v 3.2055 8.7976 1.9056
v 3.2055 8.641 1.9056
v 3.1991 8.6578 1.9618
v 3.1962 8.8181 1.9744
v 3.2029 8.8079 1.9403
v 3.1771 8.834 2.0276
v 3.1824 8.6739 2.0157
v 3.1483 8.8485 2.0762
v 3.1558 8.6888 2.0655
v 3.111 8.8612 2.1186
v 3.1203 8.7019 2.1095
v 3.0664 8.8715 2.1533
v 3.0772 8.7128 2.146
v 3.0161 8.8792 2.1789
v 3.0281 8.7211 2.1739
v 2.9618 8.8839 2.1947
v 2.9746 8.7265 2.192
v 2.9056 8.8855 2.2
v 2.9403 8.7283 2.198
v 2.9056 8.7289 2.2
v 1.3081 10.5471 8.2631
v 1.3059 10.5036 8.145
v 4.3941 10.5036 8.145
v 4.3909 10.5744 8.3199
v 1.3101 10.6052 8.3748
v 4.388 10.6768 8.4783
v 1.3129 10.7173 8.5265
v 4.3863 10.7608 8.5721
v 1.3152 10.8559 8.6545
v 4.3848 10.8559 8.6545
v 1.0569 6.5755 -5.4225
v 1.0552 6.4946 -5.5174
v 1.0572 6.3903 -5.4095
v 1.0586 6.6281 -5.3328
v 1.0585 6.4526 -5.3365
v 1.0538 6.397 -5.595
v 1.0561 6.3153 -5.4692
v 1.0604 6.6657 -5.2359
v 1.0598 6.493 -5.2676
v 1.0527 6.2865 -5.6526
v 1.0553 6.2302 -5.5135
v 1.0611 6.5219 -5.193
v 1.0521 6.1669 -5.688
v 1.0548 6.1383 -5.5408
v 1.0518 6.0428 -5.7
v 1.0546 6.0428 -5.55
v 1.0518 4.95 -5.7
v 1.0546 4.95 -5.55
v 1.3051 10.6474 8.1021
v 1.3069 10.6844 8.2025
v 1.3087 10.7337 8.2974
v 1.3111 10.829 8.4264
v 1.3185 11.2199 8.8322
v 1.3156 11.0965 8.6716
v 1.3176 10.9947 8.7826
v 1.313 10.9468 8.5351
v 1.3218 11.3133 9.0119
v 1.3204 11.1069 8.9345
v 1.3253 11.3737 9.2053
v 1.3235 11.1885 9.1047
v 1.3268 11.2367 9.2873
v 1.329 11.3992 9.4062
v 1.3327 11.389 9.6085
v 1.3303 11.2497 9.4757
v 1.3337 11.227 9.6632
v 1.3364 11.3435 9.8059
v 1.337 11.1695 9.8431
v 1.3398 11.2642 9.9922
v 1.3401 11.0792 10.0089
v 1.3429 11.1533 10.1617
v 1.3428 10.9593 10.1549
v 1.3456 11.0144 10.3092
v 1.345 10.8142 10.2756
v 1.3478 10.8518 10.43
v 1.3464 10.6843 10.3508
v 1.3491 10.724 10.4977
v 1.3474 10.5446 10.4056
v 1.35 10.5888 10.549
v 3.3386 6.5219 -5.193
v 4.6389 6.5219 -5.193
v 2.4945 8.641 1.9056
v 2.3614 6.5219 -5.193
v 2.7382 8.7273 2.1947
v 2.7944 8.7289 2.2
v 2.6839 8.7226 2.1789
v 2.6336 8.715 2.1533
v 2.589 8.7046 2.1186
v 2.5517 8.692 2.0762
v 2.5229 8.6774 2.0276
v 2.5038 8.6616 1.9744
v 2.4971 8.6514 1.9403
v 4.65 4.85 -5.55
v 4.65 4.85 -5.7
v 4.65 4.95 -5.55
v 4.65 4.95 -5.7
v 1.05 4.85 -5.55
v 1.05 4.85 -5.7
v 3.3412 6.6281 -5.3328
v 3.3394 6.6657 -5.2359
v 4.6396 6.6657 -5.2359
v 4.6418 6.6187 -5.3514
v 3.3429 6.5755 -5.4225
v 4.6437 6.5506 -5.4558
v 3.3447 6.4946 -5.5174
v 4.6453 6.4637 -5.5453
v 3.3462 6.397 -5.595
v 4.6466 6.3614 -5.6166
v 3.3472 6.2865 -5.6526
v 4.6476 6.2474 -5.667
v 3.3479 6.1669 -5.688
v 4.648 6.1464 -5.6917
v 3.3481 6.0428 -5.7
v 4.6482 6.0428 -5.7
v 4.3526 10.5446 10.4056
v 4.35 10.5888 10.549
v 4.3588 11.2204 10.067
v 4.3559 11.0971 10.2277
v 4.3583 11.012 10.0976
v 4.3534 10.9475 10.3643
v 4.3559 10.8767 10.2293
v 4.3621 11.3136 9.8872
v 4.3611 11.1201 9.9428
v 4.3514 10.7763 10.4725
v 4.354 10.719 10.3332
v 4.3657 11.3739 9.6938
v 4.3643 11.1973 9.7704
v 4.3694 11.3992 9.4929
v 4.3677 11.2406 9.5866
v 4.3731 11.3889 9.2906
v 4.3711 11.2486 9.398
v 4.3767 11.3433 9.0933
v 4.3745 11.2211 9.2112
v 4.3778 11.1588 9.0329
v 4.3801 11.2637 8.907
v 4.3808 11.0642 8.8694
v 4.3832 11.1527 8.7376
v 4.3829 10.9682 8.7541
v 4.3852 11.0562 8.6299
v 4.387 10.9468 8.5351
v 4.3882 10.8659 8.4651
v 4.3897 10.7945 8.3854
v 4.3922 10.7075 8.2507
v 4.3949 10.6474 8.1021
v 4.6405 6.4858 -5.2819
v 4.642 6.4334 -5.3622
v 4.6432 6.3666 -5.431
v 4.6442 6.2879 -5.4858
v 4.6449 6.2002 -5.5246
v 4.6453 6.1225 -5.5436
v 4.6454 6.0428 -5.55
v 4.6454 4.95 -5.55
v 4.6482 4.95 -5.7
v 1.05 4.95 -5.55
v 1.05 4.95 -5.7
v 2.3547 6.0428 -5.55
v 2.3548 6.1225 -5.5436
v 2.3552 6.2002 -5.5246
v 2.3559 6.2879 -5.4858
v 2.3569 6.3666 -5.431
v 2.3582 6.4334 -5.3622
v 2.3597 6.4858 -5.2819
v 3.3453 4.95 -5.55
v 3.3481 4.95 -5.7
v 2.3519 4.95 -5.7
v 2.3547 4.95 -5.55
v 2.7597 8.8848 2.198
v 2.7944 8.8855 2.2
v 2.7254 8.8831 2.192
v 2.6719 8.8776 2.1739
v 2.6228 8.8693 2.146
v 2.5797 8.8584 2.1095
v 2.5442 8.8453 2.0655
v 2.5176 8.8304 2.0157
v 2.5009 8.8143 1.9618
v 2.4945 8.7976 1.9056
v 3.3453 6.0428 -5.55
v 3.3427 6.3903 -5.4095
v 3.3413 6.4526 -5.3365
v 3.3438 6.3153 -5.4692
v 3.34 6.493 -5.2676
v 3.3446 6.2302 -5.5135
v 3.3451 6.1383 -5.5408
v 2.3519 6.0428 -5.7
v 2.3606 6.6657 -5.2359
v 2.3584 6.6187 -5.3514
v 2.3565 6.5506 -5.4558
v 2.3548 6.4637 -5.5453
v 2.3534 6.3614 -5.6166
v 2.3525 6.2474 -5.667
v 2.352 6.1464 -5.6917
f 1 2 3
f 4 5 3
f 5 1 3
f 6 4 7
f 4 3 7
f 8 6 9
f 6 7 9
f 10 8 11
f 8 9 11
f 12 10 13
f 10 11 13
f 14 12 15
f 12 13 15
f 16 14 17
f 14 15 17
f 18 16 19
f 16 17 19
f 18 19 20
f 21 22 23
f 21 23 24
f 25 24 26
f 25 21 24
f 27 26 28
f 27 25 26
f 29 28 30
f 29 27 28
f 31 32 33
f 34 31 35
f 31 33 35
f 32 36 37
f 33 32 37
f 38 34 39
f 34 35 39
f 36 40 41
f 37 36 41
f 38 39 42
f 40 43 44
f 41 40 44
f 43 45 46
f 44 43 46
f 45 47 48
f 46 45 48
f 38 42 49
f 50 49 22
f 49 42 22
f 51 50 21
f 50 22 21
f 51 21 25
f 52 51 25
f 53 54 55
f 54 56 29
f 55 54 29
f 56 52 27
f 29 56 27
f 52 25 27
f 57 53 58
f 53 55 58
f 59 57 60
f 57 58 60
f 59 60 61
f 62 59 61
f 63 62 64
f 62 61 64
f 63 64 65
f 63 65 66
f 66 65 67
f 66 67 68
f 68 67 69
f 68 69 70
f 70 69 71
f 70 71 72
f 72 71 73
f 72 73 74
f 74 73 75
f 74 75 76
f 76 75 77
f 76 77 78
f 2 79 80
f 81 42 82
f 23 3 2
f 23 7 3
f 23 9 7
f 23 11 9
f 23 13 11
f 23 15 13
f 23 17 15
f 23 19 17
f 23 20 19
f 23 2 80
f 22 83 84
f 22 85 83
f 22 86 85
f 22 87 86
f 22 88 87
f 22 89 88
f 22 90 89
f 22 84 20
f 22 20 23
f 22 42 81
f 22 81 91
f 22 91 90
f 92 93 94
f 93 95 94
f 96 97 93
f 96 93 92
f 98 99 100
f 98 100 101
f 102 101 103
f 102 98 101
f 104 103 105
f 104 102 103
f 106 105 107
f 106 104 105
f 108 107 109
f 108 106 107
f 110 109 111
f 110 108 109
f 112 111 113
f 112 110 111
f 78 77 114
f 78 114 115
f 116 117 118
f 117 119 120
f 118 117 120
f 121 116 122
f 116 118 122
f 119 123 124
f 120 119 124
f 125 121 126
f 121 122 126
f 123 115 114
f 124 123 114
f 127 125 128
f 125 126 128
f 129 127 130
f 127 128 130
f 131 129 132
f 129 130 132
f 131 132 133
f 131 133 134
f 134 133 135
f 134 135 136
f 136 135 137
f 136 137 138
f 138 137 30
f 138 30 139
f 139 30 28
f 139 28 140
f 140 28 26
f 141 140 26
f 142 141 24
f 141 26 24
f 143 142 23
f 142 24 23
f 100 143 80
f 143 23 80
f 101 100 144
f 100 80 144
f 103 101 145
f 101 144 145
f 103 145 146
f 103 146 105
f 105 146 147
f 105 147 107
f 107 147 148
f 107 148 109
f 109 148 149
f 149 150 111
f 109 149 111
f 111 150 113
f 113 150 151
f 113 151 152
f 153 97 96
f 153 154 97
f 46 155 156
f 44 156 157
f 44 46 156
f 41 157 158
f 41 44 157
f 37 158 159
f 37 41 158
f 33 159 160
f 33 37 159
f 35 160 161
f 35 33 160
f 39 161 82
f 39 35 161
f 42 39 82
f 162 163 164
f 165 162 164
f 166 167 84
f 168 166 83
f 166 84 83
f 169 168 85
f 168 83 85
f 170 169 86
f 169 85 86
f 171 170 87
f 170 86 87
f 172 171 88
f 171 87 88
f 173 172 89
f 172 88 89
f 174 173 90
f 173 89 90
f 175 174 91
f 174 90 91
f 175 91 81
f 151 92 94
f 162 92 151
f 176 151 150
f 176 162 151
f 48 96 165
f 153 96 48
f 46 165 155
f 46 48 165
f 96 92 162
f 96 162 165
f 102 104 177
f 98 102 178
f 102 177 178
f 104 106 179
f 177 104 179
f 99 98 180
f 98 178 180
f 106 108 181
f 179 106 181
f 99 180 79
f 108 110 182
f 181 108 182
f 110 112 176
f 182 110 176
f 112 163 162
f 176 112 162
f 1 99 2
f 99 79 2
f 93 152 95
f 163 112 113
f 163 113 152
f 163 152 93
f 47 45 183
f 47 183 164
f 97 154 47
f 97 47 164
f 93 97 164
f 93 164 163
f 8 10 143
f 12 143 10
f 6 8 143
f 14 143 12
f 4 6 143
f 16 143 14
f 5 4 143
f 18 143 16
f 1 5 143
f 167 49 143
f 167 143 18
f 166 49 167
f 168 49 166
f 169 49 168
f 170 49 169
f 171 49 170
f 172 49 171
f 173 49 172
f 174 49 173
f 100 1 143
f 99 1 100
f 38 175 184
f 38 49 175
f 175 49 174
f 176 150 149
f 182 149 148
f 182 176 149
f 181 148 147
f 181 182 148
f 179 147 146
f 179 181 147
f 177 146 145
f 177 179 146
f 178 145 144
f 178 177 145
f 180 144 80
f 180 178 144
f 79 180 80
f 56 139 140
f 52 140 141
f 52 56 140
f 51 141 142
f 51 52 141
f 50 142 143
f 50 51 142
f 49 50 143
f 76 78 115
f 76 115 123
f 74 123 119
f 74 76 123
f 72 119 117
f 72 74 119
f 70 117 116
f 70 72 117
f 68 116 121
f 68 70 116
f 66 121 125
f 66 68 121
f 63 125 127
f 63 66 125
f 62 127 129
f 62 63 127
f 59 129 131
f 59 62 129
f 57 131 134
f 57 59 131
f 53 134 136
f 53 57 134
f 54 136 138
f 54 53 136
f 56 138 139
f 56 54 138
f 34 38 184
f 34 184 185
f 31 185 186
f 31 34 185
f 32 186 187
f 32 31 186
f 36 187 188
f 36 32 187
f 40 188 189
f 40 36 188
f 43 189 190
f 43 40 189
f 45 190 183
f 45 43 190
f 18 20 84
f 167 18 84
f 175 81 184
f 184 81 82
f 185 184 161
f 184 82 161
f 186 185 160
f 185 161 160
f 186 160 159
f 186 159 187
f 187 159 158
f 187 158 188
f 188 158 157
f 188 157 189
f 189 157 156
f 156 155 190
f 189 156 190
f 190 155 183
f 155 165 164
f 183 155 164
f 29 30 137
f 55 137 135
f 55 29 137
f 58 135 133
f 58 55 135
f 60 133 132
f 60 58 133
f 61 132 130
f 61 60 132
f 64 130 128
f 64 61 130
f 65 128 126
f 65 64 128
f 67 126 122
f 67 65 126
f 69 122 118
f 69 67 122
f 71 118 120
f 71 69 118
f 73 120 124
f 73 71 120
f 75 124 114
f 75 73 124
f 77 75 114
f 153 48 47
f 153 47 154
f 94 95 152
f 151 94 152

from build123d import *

# Parameters (mm, degrees)
HOOK_LEVER_DEPTH      = 1.8
HOOK_LEVER_DEPTH_BACK = 1.8
CUT_DEPTH             = 14.210060999


with BuildPart() as part:
    # Эскиз1 → Hook_Lever (new, two sides: drawn at the far end of the back side and taken through both)
    with BuildSketch(Plane(origin=(2.85, 0, 0), x_dir=(0, 0, -1), z_dir=(1, 0, 0)).offset(-HOOK_LEVER_DEPTH_BACK)):
        with BuildLine():
            Line((5.55, 4.85), (5.55, 6.042820323))
            ThreePointArc((5.55, 6.042820323), (5.450943953, 6.341557576), (5.193024215, 6.521927904))
            Line((5.193024215, 6.521927904), (-8.144994918, 10.50362176))
            ThreePointArc((-8.144994918, 10.50362176), (-8.427699037, 10.639328236), (-8.654473244, 10.855918461))
            ThreePointArc((-8.654473244, 10.855918461), (-9.625040353, 11.23456126), (-10.40562376, 10.544589936))
            Line((-10.40562376, 10.544589936), (-10.548967324, 10.588778426))
            ThreePointArc((-10.548967324, 10.588778426), (-9.651296406, 11.382245449), (-8.535144231, 10.94680623))
            ThreePointArc((-8.535144231, 10.94680623), (-8.342386155, 10.762704538), (-8.102087654, 10.647354034))
            Line((-8.102087654, 10.647354034), (5.235931479, 6.665660178))
            ThreePointArc((5.235931479, 6.665660178), (5.571227139, 6.431178752), (5.7, 6.042820323))
            Line((5.7, 6.042820323), (5.7, 4.85))
            Line((5.7, 4.85), (5.55, 4.85))
        make_face()
    extrude(amount=HOOK_LEVER_DEPTH + HOOK_LEVER_DEPTH_BACK)

    # Эскиз2 → Cut (cut, through all)
    with BuildSketch(Plane(origin=(0, 4.95, 0), x_dir=(1, 0, 0), z_dir=(0, 1, 0))):
        Polygon((1.05, 5.8), (1.35, -10.548967324), (1.05, -10.548967324), align=None)
        Polygon((4.65, 5.8), (4.65, -10.548967324), (4.35, -10.548967324), align=None)
        with BuildLine():
            Line((2.35, 5.8), (3.35, 5.8))
            Line((3.35, 5.8), (3.20551955, -1.905624011))
            ThreePointArc((3.20551955, -1.905624011), (3.115706509, -2.11411119), (2.90557227, -2.2))
            Line((2.90557227, -2.2), (2.79442773, -2.2))
            ThreePointArc((2.79442773, -2.2), (2.584293491, -2.11411119), (2.49448045, -1.905624011))
            Line((2.49448045, -1.905624011), (2.35, 5.8))
        make_face()
    extrude(amount=CUT_DEPTH, mode=Mode.SUBTRACT)


solid = part.part
